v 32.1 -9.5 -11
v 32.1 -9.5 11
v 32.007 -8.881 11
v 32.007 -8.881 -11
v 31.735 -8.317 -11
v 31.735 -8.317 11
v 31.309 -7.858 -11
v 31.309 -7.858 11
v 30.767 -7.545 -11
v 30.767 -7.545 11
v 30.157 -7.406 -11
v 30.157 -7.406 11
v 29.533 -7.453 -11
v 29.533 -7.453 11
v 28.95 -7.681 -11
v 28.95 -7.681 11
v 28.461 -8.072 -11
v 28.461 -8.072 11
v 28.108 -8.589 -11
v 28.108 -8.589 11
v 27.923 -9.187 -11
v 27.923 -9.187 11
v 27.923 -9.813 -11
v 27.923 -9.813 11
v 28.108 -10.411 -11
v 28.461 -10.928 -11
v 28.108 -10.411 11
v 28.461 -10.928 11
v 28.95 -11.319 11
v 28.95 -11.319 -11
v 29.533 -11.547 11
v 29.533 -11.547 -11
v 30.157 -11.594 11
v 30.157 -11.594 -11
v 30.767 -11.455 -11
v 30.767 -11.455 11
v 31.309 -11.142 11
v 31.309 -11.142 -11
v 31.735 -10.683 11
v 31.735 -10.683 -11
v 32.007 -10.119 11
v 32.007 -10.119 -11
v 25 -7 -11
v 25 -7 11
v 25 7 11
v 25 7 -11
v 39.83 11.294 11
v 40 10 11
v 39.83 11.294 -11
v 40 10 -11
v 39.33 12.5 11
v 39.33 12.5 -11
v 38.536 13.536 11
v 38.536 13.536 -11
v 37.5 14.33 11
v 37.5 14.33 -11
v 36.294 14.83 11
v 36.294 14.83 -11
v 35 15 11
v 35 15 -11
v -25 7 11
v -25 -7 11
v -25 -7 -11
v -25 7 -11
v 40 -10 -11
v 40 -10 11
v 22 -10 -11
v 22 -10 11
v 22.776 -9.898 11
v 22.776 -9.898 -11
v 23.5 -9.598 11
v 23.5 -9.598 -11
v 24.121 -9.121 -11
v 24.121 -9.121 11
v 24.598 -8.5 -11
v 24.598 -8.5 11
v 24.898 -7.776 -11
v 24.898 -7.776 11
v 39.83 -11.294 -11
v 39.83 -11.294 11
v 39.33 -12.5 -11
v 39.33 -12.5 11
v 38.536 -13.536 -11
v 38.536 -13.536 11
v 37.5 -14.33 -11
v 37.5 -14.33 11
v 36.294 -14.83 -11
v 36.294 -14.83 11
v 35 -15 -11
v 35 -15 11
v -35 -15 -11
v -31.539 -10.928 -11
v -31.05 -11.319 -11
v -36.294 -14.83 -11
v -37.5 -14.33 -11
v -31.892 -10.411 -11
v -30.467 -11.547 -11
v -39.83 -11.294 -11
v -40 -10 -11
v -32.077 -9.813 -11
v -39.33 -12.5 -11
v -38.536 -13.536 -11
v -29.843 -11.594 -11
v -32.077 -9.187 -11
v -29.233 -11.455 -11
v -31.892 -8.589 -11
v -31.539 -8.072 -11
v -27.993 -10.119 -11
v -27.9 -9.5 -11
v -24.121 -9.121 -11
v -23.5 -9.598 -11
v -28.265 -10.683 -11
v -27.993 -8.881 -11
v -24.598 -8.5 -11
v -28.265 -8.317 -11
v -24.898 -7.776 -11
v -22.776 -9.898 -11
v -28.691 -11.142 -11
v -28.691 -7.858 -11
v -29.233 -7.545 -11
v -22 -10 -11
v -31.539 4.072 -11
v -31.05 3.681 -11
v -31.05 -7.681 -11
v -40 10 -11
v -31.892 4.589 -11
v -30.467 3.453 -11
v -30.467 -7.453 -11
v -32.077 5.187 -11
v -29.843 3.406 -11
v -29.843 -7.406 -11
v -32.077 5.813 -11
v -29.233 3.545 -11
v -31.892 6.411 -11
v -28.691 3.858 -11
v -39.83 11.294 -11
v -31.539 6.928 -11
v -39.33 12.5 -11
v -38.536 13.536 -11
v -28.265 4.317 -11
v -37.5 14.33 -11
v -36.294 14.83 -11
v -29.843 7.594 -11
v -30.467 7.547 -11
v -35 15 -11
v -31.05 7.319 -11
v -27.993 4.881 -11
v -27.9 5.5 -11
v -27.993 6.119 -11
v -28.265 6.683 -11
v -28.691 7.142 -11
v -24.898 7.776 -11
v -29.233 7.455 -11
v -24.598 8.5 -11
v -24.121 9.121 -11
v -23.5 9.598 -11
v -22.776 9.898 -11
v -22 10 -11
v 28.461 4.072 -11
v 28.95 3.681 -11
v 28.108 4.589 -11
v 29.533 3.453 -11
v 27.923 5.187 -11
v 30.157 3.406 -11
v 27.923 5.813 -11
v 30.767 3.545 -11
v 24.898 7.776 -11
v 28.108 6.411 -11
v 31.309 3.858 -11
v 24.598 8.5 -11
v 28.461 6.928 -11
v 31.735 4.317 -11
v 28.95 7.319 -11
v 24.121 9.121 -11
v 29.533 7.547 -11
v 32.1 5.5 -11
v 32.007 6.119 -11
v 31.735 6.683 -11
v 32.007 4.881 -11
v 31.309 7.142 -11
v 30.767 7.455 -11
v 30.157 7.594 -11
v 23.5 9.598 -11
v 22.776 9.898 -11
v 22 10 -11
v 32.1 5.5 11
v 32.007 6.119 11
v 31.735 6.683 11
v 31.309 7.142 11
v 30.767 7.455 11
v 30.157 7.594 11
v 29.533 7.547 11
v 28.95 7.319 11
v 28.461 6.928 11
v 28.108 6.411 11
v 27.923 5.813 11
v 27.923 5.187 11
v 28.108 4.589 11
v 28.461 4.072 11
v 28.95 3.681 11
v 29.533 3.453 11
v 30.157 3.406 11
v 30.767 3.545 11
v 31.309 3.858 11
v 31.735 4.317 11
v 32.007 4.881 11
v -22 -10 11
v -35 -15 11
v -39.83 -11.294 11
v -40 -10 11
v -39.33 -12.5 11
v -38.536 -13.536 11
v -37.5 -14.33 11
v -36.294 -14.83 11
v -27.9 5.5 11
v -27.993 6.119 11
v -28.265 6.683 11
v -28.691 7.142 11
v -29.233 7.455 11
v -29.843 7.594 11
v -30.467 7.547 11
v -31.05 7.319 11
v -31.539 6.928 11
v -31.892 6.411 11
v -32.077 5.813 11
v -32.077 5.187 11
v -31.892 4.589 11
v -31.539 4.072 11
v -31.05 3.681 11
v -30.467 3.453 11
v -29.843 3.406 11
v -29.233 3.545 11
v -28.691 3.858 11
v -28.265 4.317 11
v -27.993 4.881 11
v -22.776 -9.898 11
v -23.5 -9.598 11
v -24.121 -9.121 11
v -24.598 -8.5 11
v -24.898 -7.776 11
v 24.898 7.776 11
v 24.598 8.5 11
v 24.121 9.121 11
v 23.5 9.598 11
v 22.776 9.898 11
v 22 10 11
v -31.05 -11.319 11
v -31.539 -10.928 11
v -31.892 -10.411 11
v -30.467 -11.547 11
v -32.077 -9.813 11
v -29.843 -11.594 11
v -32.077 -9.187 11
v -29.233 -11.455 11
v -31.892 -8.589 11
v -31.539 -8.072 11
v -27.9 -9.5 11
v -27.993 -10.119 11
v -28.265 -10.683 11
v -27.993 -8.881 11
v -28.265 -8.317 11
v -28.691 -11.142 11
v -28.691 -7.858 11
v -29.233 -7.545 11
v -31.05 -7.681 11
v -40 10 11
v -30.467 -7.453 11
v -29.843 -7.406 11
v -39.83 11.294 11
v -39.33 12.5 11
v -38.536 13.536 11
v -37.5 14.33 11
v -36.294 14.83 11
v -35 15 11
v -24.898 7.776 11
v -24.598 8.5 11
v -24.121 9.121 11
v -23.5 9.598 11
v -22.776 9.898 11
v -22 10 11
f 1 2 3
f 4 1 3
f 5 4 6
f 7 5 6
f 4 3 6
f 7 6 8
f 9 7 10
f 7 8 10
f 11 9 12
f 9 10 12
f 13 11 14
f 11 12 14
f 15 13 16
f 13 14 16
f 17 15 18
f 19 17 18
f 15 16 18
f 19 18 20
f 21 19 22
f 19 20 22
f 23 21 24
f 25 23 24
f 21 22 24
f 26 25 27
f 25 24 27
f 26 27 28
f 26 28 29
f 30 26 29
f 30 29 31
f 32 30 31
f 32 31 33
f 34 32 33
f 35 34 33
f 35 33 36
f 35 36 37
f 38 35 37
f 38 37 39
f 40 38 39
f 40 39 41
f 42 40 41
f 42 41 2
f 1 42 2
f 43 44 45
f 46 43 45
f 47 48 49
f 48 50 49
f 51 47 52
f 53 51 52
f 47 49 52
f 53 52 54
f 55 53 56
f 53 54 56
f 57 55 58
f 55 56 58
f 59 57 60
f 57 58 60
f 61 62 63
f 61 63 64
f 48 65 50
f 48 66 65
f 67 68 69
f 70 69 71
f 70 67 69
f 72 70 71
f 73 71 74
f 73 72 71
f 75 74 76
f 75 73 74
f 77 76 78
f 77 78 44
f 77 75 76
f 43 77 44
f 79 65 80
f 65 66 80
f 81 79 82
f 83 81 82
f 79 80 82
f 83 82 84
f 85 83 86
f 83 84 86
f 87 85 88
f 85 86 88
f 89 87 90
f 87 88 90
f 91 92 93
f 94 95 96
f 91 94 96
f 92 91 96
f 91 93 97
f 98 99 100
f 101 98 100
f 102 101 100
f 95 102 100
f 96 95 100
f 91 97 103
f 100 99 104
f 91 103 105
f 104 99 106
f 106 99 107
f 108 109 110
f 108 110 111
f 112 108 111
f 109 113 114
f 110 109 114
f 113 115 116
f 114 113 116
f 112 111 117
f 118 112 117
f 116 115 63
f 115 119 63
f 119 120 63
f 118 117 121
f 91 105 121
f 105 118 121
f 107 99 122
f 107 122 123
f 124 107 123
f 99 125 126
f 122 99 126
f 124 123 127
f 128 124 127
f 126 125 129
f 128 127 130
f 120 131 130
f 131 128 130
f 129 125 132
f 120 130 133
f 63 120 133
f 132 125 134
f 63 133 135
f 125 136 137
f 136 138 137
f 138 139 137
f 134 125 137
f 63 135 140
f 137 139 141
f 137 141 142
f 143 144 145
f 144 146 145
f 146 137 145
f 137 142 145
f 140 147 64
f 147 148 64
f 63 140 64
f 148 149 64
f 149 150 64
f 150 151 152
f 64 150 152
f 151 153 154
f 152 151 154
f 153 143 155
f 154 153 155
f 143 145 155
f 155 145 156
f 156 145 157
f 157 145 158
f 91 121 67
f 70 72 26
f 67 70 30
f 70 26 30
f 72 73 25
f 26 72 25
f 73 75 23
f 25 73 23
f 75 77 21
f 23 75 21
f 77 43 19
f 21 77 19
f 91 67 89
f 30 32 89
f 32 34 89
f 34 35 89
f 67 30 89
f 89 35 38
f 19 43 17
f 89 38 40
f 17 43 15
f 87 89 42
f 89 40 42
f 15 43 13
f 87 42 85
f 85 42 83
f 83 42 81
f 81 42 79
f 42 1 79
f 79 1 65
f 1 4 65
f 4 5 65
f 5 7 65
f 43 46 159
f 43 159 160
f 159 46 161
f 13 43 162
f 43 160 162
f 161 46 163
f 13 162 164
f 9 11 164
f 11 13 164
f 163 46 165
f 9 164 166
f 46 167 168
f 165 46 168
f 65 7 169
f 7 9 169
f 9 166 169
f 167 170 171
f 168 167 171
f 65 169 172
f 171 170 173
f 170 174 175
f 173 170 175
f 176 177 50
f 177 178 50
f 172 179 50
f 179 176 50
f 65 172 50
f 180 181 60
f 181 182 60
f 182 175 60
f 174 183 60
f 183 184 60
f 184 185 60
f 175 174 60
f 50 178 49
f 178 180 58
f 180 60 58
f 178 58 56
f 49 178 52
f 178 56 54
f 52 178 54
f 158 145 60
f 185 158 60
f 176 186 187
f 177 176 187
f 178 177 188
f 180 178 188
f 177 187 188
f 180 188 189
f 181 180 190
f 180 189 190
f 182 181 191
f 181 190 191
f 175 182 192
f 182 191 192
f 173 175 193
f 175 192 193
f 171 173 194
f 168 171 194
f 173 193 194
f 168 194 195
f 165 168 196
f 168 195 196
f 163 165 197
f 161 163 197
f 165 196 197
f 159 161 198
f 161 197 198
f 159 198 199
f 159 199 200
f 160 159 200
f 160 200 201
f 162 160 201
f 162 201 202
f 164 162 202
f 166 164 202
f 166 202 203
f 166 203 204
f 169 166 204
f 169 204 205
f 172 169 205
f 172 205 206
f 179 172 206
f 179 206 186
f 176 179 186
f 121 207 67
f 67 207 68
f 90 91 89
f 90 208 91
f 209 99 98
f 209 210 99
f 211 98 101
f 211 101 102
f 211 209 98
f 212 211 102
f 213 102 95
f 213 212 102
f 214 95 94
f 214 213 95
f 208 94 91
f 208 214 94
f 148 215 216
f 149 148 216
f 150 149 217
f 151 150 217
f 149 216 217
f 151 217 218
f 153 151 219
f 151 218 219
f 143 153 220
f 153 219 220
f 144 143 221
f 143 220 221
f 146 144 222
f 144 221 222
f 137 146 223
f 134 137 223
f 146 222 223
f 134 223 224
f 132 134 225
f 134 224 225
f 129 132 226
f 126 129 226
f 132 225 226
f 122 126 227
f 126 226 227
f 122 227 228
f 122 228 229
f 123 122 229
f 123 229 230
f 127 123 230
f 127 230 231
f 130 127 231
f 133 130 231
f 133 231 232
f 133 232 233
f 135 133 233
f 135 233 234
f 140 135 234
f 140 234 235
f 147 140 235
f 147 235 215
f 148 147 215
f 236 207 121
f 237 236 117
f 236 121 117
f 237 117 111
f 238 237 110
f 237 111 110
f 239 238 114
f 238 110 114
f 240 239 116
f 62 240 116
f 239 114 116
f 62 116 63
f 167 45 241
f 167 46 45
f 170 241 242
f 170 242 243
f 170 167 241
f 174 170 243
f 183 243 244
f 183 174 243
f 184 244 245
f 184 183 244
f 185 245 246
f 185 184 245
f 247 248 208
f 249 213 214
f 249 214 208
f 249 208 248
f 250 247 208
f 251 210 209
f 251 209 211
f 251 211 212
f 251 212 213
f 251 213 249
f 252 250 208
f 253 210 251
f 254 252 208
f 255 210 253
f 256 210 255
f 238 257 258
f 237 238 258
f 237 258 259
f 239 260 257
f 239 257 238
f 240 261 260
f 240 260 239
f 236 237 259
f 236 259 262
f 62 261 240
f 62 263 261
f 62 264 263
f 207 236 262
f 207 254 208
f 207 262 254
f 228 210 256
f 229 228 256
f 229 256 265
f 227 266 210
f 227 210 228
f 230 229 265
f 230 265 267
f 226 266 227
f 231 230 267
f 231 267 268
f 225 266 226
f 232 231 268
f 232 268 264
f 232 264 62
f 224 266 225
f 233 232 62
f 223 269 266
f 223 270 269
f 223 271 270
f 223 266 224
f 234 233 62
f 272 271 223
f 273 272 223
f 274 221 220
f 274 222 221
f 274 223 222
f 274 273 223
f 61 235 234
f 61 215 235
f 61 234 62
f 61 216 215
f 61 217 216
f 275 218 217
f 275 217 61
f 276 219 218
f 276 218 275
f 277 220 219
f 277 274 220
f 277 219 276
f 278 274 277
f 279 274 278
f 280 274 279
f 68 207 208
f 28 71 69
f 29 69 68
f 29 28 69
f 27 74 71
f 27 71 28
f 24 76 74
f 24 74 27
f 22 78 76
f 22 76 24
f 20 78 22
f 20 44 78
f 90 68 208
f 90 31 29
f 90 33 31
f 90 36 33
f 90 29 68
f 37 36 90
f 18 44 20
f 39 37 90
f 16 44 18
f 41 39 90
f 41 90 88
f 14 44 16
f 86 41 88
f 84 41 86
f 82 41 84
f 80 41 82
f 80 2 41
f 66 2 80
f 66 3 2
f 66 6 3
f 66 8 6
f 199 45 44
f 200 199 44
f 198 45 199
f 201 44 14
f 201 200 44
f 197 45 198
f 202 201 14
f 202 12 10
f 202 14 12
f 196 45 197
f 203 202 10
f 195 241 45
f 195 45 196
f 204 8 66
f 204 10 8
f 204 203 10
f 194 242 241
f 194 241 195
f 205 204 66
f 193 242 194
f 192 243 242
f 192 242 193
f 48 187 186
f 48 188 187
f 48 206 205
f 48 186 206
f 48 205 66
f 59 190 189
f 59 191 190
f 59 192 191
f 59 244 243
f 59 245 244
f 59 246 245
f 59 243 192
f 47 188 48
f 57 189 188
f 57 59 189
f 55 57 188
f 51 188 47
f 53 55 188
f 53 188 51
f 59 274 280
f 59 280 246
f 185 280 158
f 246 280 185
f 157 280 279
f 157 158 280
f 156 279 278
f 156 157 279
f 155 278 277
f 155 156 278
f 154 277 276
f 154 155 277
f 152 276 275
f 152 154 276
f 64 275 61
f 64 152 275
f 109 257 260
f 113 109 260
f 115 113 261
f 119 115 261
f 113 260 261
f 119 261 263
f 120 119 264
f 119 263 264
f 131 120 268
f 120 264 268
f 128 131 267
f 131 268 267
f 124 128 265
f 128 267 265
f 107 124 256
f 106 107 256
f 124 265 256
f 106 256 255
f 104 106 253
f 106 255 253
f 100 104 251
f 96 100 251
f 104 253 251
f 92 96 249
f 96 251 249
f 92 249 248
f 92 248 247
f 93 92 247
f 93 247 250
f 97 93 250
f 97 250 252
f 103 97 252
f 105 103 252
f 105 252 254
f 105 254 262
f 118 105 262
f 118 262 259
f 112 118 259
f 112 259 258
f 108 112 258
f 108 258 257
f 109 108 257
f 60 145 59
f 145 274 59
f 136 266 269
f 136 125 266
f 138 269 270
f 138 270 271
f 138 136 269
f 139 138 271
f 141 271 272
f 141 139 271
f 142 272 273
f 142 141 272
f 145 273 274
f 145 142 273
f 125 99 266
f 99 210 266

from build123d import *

# Parameters (mm, degrees)
SKETCH_1_W          = 80
SKETCH_1_H          = 30
EXTRUDE_1_DEPTH     = 11
FILLET_1_R          = 5
SKETCH_2_R          = 2.1
SKETCH_2_W          = 50
SKETCH_2_H          = 20
CUT_EXTRUDE_1_DEPTH = 23
FILLET_2_R          = 3


with BuildPart() as part:
    # 草图1 → 凸台-拉伸1 (new body, symmetric)
    with BuildSketch(Plane.XY):
        Rectangle(SKETCH_1_W, SKETCH_1_H)
    extrude(amount=EXTRUDE_1_DEPTH, both=True)

    # 圆角1
    fillet_1_edges = [part.edges().sort_by_distance(p)[0] for p in [
        (40, -15, 0),
        (-40, -15, 0),
        (-40, 15, 0),
        (40, 15, 0),
    ]]
    fillet(fillet_1_edges, radius=FILLET_1_R)

    # 草图2 → 切除-拉伸1 (cut, through all)
    with BuildSketch(Plane.XY.offset(11)):
        with Locations((-30, 5.5)):
            Circle(SKETCH_2_R)
        with Locations((30, 5.5)):
            Circle(SKETCH_2_R)
        with Locations((30, -9.5)):
            Circle(SKETCH_2_R)
        with Locations((-30, -9.5)):
            Circle(SKETCH_2_R)
        Rectangle(SKETCH_2_W, SKETCH_2_H)
    extrude(amount=-CUT_EXTRUDE_1_DEPTH, mode=Mode.SUBTRACT)

    # 圆角2
    fillet_2_edges = [part.edges().sort_by_distance(p)[0] for p in [
        (25, 10, 0),
        (25, -10, 0),
        (-25, -10, 0),
        (-25, 10, 0),
    ]]
    fillet(fillet_2_edges, radius=FILLET_2_R)


solid = part.part
